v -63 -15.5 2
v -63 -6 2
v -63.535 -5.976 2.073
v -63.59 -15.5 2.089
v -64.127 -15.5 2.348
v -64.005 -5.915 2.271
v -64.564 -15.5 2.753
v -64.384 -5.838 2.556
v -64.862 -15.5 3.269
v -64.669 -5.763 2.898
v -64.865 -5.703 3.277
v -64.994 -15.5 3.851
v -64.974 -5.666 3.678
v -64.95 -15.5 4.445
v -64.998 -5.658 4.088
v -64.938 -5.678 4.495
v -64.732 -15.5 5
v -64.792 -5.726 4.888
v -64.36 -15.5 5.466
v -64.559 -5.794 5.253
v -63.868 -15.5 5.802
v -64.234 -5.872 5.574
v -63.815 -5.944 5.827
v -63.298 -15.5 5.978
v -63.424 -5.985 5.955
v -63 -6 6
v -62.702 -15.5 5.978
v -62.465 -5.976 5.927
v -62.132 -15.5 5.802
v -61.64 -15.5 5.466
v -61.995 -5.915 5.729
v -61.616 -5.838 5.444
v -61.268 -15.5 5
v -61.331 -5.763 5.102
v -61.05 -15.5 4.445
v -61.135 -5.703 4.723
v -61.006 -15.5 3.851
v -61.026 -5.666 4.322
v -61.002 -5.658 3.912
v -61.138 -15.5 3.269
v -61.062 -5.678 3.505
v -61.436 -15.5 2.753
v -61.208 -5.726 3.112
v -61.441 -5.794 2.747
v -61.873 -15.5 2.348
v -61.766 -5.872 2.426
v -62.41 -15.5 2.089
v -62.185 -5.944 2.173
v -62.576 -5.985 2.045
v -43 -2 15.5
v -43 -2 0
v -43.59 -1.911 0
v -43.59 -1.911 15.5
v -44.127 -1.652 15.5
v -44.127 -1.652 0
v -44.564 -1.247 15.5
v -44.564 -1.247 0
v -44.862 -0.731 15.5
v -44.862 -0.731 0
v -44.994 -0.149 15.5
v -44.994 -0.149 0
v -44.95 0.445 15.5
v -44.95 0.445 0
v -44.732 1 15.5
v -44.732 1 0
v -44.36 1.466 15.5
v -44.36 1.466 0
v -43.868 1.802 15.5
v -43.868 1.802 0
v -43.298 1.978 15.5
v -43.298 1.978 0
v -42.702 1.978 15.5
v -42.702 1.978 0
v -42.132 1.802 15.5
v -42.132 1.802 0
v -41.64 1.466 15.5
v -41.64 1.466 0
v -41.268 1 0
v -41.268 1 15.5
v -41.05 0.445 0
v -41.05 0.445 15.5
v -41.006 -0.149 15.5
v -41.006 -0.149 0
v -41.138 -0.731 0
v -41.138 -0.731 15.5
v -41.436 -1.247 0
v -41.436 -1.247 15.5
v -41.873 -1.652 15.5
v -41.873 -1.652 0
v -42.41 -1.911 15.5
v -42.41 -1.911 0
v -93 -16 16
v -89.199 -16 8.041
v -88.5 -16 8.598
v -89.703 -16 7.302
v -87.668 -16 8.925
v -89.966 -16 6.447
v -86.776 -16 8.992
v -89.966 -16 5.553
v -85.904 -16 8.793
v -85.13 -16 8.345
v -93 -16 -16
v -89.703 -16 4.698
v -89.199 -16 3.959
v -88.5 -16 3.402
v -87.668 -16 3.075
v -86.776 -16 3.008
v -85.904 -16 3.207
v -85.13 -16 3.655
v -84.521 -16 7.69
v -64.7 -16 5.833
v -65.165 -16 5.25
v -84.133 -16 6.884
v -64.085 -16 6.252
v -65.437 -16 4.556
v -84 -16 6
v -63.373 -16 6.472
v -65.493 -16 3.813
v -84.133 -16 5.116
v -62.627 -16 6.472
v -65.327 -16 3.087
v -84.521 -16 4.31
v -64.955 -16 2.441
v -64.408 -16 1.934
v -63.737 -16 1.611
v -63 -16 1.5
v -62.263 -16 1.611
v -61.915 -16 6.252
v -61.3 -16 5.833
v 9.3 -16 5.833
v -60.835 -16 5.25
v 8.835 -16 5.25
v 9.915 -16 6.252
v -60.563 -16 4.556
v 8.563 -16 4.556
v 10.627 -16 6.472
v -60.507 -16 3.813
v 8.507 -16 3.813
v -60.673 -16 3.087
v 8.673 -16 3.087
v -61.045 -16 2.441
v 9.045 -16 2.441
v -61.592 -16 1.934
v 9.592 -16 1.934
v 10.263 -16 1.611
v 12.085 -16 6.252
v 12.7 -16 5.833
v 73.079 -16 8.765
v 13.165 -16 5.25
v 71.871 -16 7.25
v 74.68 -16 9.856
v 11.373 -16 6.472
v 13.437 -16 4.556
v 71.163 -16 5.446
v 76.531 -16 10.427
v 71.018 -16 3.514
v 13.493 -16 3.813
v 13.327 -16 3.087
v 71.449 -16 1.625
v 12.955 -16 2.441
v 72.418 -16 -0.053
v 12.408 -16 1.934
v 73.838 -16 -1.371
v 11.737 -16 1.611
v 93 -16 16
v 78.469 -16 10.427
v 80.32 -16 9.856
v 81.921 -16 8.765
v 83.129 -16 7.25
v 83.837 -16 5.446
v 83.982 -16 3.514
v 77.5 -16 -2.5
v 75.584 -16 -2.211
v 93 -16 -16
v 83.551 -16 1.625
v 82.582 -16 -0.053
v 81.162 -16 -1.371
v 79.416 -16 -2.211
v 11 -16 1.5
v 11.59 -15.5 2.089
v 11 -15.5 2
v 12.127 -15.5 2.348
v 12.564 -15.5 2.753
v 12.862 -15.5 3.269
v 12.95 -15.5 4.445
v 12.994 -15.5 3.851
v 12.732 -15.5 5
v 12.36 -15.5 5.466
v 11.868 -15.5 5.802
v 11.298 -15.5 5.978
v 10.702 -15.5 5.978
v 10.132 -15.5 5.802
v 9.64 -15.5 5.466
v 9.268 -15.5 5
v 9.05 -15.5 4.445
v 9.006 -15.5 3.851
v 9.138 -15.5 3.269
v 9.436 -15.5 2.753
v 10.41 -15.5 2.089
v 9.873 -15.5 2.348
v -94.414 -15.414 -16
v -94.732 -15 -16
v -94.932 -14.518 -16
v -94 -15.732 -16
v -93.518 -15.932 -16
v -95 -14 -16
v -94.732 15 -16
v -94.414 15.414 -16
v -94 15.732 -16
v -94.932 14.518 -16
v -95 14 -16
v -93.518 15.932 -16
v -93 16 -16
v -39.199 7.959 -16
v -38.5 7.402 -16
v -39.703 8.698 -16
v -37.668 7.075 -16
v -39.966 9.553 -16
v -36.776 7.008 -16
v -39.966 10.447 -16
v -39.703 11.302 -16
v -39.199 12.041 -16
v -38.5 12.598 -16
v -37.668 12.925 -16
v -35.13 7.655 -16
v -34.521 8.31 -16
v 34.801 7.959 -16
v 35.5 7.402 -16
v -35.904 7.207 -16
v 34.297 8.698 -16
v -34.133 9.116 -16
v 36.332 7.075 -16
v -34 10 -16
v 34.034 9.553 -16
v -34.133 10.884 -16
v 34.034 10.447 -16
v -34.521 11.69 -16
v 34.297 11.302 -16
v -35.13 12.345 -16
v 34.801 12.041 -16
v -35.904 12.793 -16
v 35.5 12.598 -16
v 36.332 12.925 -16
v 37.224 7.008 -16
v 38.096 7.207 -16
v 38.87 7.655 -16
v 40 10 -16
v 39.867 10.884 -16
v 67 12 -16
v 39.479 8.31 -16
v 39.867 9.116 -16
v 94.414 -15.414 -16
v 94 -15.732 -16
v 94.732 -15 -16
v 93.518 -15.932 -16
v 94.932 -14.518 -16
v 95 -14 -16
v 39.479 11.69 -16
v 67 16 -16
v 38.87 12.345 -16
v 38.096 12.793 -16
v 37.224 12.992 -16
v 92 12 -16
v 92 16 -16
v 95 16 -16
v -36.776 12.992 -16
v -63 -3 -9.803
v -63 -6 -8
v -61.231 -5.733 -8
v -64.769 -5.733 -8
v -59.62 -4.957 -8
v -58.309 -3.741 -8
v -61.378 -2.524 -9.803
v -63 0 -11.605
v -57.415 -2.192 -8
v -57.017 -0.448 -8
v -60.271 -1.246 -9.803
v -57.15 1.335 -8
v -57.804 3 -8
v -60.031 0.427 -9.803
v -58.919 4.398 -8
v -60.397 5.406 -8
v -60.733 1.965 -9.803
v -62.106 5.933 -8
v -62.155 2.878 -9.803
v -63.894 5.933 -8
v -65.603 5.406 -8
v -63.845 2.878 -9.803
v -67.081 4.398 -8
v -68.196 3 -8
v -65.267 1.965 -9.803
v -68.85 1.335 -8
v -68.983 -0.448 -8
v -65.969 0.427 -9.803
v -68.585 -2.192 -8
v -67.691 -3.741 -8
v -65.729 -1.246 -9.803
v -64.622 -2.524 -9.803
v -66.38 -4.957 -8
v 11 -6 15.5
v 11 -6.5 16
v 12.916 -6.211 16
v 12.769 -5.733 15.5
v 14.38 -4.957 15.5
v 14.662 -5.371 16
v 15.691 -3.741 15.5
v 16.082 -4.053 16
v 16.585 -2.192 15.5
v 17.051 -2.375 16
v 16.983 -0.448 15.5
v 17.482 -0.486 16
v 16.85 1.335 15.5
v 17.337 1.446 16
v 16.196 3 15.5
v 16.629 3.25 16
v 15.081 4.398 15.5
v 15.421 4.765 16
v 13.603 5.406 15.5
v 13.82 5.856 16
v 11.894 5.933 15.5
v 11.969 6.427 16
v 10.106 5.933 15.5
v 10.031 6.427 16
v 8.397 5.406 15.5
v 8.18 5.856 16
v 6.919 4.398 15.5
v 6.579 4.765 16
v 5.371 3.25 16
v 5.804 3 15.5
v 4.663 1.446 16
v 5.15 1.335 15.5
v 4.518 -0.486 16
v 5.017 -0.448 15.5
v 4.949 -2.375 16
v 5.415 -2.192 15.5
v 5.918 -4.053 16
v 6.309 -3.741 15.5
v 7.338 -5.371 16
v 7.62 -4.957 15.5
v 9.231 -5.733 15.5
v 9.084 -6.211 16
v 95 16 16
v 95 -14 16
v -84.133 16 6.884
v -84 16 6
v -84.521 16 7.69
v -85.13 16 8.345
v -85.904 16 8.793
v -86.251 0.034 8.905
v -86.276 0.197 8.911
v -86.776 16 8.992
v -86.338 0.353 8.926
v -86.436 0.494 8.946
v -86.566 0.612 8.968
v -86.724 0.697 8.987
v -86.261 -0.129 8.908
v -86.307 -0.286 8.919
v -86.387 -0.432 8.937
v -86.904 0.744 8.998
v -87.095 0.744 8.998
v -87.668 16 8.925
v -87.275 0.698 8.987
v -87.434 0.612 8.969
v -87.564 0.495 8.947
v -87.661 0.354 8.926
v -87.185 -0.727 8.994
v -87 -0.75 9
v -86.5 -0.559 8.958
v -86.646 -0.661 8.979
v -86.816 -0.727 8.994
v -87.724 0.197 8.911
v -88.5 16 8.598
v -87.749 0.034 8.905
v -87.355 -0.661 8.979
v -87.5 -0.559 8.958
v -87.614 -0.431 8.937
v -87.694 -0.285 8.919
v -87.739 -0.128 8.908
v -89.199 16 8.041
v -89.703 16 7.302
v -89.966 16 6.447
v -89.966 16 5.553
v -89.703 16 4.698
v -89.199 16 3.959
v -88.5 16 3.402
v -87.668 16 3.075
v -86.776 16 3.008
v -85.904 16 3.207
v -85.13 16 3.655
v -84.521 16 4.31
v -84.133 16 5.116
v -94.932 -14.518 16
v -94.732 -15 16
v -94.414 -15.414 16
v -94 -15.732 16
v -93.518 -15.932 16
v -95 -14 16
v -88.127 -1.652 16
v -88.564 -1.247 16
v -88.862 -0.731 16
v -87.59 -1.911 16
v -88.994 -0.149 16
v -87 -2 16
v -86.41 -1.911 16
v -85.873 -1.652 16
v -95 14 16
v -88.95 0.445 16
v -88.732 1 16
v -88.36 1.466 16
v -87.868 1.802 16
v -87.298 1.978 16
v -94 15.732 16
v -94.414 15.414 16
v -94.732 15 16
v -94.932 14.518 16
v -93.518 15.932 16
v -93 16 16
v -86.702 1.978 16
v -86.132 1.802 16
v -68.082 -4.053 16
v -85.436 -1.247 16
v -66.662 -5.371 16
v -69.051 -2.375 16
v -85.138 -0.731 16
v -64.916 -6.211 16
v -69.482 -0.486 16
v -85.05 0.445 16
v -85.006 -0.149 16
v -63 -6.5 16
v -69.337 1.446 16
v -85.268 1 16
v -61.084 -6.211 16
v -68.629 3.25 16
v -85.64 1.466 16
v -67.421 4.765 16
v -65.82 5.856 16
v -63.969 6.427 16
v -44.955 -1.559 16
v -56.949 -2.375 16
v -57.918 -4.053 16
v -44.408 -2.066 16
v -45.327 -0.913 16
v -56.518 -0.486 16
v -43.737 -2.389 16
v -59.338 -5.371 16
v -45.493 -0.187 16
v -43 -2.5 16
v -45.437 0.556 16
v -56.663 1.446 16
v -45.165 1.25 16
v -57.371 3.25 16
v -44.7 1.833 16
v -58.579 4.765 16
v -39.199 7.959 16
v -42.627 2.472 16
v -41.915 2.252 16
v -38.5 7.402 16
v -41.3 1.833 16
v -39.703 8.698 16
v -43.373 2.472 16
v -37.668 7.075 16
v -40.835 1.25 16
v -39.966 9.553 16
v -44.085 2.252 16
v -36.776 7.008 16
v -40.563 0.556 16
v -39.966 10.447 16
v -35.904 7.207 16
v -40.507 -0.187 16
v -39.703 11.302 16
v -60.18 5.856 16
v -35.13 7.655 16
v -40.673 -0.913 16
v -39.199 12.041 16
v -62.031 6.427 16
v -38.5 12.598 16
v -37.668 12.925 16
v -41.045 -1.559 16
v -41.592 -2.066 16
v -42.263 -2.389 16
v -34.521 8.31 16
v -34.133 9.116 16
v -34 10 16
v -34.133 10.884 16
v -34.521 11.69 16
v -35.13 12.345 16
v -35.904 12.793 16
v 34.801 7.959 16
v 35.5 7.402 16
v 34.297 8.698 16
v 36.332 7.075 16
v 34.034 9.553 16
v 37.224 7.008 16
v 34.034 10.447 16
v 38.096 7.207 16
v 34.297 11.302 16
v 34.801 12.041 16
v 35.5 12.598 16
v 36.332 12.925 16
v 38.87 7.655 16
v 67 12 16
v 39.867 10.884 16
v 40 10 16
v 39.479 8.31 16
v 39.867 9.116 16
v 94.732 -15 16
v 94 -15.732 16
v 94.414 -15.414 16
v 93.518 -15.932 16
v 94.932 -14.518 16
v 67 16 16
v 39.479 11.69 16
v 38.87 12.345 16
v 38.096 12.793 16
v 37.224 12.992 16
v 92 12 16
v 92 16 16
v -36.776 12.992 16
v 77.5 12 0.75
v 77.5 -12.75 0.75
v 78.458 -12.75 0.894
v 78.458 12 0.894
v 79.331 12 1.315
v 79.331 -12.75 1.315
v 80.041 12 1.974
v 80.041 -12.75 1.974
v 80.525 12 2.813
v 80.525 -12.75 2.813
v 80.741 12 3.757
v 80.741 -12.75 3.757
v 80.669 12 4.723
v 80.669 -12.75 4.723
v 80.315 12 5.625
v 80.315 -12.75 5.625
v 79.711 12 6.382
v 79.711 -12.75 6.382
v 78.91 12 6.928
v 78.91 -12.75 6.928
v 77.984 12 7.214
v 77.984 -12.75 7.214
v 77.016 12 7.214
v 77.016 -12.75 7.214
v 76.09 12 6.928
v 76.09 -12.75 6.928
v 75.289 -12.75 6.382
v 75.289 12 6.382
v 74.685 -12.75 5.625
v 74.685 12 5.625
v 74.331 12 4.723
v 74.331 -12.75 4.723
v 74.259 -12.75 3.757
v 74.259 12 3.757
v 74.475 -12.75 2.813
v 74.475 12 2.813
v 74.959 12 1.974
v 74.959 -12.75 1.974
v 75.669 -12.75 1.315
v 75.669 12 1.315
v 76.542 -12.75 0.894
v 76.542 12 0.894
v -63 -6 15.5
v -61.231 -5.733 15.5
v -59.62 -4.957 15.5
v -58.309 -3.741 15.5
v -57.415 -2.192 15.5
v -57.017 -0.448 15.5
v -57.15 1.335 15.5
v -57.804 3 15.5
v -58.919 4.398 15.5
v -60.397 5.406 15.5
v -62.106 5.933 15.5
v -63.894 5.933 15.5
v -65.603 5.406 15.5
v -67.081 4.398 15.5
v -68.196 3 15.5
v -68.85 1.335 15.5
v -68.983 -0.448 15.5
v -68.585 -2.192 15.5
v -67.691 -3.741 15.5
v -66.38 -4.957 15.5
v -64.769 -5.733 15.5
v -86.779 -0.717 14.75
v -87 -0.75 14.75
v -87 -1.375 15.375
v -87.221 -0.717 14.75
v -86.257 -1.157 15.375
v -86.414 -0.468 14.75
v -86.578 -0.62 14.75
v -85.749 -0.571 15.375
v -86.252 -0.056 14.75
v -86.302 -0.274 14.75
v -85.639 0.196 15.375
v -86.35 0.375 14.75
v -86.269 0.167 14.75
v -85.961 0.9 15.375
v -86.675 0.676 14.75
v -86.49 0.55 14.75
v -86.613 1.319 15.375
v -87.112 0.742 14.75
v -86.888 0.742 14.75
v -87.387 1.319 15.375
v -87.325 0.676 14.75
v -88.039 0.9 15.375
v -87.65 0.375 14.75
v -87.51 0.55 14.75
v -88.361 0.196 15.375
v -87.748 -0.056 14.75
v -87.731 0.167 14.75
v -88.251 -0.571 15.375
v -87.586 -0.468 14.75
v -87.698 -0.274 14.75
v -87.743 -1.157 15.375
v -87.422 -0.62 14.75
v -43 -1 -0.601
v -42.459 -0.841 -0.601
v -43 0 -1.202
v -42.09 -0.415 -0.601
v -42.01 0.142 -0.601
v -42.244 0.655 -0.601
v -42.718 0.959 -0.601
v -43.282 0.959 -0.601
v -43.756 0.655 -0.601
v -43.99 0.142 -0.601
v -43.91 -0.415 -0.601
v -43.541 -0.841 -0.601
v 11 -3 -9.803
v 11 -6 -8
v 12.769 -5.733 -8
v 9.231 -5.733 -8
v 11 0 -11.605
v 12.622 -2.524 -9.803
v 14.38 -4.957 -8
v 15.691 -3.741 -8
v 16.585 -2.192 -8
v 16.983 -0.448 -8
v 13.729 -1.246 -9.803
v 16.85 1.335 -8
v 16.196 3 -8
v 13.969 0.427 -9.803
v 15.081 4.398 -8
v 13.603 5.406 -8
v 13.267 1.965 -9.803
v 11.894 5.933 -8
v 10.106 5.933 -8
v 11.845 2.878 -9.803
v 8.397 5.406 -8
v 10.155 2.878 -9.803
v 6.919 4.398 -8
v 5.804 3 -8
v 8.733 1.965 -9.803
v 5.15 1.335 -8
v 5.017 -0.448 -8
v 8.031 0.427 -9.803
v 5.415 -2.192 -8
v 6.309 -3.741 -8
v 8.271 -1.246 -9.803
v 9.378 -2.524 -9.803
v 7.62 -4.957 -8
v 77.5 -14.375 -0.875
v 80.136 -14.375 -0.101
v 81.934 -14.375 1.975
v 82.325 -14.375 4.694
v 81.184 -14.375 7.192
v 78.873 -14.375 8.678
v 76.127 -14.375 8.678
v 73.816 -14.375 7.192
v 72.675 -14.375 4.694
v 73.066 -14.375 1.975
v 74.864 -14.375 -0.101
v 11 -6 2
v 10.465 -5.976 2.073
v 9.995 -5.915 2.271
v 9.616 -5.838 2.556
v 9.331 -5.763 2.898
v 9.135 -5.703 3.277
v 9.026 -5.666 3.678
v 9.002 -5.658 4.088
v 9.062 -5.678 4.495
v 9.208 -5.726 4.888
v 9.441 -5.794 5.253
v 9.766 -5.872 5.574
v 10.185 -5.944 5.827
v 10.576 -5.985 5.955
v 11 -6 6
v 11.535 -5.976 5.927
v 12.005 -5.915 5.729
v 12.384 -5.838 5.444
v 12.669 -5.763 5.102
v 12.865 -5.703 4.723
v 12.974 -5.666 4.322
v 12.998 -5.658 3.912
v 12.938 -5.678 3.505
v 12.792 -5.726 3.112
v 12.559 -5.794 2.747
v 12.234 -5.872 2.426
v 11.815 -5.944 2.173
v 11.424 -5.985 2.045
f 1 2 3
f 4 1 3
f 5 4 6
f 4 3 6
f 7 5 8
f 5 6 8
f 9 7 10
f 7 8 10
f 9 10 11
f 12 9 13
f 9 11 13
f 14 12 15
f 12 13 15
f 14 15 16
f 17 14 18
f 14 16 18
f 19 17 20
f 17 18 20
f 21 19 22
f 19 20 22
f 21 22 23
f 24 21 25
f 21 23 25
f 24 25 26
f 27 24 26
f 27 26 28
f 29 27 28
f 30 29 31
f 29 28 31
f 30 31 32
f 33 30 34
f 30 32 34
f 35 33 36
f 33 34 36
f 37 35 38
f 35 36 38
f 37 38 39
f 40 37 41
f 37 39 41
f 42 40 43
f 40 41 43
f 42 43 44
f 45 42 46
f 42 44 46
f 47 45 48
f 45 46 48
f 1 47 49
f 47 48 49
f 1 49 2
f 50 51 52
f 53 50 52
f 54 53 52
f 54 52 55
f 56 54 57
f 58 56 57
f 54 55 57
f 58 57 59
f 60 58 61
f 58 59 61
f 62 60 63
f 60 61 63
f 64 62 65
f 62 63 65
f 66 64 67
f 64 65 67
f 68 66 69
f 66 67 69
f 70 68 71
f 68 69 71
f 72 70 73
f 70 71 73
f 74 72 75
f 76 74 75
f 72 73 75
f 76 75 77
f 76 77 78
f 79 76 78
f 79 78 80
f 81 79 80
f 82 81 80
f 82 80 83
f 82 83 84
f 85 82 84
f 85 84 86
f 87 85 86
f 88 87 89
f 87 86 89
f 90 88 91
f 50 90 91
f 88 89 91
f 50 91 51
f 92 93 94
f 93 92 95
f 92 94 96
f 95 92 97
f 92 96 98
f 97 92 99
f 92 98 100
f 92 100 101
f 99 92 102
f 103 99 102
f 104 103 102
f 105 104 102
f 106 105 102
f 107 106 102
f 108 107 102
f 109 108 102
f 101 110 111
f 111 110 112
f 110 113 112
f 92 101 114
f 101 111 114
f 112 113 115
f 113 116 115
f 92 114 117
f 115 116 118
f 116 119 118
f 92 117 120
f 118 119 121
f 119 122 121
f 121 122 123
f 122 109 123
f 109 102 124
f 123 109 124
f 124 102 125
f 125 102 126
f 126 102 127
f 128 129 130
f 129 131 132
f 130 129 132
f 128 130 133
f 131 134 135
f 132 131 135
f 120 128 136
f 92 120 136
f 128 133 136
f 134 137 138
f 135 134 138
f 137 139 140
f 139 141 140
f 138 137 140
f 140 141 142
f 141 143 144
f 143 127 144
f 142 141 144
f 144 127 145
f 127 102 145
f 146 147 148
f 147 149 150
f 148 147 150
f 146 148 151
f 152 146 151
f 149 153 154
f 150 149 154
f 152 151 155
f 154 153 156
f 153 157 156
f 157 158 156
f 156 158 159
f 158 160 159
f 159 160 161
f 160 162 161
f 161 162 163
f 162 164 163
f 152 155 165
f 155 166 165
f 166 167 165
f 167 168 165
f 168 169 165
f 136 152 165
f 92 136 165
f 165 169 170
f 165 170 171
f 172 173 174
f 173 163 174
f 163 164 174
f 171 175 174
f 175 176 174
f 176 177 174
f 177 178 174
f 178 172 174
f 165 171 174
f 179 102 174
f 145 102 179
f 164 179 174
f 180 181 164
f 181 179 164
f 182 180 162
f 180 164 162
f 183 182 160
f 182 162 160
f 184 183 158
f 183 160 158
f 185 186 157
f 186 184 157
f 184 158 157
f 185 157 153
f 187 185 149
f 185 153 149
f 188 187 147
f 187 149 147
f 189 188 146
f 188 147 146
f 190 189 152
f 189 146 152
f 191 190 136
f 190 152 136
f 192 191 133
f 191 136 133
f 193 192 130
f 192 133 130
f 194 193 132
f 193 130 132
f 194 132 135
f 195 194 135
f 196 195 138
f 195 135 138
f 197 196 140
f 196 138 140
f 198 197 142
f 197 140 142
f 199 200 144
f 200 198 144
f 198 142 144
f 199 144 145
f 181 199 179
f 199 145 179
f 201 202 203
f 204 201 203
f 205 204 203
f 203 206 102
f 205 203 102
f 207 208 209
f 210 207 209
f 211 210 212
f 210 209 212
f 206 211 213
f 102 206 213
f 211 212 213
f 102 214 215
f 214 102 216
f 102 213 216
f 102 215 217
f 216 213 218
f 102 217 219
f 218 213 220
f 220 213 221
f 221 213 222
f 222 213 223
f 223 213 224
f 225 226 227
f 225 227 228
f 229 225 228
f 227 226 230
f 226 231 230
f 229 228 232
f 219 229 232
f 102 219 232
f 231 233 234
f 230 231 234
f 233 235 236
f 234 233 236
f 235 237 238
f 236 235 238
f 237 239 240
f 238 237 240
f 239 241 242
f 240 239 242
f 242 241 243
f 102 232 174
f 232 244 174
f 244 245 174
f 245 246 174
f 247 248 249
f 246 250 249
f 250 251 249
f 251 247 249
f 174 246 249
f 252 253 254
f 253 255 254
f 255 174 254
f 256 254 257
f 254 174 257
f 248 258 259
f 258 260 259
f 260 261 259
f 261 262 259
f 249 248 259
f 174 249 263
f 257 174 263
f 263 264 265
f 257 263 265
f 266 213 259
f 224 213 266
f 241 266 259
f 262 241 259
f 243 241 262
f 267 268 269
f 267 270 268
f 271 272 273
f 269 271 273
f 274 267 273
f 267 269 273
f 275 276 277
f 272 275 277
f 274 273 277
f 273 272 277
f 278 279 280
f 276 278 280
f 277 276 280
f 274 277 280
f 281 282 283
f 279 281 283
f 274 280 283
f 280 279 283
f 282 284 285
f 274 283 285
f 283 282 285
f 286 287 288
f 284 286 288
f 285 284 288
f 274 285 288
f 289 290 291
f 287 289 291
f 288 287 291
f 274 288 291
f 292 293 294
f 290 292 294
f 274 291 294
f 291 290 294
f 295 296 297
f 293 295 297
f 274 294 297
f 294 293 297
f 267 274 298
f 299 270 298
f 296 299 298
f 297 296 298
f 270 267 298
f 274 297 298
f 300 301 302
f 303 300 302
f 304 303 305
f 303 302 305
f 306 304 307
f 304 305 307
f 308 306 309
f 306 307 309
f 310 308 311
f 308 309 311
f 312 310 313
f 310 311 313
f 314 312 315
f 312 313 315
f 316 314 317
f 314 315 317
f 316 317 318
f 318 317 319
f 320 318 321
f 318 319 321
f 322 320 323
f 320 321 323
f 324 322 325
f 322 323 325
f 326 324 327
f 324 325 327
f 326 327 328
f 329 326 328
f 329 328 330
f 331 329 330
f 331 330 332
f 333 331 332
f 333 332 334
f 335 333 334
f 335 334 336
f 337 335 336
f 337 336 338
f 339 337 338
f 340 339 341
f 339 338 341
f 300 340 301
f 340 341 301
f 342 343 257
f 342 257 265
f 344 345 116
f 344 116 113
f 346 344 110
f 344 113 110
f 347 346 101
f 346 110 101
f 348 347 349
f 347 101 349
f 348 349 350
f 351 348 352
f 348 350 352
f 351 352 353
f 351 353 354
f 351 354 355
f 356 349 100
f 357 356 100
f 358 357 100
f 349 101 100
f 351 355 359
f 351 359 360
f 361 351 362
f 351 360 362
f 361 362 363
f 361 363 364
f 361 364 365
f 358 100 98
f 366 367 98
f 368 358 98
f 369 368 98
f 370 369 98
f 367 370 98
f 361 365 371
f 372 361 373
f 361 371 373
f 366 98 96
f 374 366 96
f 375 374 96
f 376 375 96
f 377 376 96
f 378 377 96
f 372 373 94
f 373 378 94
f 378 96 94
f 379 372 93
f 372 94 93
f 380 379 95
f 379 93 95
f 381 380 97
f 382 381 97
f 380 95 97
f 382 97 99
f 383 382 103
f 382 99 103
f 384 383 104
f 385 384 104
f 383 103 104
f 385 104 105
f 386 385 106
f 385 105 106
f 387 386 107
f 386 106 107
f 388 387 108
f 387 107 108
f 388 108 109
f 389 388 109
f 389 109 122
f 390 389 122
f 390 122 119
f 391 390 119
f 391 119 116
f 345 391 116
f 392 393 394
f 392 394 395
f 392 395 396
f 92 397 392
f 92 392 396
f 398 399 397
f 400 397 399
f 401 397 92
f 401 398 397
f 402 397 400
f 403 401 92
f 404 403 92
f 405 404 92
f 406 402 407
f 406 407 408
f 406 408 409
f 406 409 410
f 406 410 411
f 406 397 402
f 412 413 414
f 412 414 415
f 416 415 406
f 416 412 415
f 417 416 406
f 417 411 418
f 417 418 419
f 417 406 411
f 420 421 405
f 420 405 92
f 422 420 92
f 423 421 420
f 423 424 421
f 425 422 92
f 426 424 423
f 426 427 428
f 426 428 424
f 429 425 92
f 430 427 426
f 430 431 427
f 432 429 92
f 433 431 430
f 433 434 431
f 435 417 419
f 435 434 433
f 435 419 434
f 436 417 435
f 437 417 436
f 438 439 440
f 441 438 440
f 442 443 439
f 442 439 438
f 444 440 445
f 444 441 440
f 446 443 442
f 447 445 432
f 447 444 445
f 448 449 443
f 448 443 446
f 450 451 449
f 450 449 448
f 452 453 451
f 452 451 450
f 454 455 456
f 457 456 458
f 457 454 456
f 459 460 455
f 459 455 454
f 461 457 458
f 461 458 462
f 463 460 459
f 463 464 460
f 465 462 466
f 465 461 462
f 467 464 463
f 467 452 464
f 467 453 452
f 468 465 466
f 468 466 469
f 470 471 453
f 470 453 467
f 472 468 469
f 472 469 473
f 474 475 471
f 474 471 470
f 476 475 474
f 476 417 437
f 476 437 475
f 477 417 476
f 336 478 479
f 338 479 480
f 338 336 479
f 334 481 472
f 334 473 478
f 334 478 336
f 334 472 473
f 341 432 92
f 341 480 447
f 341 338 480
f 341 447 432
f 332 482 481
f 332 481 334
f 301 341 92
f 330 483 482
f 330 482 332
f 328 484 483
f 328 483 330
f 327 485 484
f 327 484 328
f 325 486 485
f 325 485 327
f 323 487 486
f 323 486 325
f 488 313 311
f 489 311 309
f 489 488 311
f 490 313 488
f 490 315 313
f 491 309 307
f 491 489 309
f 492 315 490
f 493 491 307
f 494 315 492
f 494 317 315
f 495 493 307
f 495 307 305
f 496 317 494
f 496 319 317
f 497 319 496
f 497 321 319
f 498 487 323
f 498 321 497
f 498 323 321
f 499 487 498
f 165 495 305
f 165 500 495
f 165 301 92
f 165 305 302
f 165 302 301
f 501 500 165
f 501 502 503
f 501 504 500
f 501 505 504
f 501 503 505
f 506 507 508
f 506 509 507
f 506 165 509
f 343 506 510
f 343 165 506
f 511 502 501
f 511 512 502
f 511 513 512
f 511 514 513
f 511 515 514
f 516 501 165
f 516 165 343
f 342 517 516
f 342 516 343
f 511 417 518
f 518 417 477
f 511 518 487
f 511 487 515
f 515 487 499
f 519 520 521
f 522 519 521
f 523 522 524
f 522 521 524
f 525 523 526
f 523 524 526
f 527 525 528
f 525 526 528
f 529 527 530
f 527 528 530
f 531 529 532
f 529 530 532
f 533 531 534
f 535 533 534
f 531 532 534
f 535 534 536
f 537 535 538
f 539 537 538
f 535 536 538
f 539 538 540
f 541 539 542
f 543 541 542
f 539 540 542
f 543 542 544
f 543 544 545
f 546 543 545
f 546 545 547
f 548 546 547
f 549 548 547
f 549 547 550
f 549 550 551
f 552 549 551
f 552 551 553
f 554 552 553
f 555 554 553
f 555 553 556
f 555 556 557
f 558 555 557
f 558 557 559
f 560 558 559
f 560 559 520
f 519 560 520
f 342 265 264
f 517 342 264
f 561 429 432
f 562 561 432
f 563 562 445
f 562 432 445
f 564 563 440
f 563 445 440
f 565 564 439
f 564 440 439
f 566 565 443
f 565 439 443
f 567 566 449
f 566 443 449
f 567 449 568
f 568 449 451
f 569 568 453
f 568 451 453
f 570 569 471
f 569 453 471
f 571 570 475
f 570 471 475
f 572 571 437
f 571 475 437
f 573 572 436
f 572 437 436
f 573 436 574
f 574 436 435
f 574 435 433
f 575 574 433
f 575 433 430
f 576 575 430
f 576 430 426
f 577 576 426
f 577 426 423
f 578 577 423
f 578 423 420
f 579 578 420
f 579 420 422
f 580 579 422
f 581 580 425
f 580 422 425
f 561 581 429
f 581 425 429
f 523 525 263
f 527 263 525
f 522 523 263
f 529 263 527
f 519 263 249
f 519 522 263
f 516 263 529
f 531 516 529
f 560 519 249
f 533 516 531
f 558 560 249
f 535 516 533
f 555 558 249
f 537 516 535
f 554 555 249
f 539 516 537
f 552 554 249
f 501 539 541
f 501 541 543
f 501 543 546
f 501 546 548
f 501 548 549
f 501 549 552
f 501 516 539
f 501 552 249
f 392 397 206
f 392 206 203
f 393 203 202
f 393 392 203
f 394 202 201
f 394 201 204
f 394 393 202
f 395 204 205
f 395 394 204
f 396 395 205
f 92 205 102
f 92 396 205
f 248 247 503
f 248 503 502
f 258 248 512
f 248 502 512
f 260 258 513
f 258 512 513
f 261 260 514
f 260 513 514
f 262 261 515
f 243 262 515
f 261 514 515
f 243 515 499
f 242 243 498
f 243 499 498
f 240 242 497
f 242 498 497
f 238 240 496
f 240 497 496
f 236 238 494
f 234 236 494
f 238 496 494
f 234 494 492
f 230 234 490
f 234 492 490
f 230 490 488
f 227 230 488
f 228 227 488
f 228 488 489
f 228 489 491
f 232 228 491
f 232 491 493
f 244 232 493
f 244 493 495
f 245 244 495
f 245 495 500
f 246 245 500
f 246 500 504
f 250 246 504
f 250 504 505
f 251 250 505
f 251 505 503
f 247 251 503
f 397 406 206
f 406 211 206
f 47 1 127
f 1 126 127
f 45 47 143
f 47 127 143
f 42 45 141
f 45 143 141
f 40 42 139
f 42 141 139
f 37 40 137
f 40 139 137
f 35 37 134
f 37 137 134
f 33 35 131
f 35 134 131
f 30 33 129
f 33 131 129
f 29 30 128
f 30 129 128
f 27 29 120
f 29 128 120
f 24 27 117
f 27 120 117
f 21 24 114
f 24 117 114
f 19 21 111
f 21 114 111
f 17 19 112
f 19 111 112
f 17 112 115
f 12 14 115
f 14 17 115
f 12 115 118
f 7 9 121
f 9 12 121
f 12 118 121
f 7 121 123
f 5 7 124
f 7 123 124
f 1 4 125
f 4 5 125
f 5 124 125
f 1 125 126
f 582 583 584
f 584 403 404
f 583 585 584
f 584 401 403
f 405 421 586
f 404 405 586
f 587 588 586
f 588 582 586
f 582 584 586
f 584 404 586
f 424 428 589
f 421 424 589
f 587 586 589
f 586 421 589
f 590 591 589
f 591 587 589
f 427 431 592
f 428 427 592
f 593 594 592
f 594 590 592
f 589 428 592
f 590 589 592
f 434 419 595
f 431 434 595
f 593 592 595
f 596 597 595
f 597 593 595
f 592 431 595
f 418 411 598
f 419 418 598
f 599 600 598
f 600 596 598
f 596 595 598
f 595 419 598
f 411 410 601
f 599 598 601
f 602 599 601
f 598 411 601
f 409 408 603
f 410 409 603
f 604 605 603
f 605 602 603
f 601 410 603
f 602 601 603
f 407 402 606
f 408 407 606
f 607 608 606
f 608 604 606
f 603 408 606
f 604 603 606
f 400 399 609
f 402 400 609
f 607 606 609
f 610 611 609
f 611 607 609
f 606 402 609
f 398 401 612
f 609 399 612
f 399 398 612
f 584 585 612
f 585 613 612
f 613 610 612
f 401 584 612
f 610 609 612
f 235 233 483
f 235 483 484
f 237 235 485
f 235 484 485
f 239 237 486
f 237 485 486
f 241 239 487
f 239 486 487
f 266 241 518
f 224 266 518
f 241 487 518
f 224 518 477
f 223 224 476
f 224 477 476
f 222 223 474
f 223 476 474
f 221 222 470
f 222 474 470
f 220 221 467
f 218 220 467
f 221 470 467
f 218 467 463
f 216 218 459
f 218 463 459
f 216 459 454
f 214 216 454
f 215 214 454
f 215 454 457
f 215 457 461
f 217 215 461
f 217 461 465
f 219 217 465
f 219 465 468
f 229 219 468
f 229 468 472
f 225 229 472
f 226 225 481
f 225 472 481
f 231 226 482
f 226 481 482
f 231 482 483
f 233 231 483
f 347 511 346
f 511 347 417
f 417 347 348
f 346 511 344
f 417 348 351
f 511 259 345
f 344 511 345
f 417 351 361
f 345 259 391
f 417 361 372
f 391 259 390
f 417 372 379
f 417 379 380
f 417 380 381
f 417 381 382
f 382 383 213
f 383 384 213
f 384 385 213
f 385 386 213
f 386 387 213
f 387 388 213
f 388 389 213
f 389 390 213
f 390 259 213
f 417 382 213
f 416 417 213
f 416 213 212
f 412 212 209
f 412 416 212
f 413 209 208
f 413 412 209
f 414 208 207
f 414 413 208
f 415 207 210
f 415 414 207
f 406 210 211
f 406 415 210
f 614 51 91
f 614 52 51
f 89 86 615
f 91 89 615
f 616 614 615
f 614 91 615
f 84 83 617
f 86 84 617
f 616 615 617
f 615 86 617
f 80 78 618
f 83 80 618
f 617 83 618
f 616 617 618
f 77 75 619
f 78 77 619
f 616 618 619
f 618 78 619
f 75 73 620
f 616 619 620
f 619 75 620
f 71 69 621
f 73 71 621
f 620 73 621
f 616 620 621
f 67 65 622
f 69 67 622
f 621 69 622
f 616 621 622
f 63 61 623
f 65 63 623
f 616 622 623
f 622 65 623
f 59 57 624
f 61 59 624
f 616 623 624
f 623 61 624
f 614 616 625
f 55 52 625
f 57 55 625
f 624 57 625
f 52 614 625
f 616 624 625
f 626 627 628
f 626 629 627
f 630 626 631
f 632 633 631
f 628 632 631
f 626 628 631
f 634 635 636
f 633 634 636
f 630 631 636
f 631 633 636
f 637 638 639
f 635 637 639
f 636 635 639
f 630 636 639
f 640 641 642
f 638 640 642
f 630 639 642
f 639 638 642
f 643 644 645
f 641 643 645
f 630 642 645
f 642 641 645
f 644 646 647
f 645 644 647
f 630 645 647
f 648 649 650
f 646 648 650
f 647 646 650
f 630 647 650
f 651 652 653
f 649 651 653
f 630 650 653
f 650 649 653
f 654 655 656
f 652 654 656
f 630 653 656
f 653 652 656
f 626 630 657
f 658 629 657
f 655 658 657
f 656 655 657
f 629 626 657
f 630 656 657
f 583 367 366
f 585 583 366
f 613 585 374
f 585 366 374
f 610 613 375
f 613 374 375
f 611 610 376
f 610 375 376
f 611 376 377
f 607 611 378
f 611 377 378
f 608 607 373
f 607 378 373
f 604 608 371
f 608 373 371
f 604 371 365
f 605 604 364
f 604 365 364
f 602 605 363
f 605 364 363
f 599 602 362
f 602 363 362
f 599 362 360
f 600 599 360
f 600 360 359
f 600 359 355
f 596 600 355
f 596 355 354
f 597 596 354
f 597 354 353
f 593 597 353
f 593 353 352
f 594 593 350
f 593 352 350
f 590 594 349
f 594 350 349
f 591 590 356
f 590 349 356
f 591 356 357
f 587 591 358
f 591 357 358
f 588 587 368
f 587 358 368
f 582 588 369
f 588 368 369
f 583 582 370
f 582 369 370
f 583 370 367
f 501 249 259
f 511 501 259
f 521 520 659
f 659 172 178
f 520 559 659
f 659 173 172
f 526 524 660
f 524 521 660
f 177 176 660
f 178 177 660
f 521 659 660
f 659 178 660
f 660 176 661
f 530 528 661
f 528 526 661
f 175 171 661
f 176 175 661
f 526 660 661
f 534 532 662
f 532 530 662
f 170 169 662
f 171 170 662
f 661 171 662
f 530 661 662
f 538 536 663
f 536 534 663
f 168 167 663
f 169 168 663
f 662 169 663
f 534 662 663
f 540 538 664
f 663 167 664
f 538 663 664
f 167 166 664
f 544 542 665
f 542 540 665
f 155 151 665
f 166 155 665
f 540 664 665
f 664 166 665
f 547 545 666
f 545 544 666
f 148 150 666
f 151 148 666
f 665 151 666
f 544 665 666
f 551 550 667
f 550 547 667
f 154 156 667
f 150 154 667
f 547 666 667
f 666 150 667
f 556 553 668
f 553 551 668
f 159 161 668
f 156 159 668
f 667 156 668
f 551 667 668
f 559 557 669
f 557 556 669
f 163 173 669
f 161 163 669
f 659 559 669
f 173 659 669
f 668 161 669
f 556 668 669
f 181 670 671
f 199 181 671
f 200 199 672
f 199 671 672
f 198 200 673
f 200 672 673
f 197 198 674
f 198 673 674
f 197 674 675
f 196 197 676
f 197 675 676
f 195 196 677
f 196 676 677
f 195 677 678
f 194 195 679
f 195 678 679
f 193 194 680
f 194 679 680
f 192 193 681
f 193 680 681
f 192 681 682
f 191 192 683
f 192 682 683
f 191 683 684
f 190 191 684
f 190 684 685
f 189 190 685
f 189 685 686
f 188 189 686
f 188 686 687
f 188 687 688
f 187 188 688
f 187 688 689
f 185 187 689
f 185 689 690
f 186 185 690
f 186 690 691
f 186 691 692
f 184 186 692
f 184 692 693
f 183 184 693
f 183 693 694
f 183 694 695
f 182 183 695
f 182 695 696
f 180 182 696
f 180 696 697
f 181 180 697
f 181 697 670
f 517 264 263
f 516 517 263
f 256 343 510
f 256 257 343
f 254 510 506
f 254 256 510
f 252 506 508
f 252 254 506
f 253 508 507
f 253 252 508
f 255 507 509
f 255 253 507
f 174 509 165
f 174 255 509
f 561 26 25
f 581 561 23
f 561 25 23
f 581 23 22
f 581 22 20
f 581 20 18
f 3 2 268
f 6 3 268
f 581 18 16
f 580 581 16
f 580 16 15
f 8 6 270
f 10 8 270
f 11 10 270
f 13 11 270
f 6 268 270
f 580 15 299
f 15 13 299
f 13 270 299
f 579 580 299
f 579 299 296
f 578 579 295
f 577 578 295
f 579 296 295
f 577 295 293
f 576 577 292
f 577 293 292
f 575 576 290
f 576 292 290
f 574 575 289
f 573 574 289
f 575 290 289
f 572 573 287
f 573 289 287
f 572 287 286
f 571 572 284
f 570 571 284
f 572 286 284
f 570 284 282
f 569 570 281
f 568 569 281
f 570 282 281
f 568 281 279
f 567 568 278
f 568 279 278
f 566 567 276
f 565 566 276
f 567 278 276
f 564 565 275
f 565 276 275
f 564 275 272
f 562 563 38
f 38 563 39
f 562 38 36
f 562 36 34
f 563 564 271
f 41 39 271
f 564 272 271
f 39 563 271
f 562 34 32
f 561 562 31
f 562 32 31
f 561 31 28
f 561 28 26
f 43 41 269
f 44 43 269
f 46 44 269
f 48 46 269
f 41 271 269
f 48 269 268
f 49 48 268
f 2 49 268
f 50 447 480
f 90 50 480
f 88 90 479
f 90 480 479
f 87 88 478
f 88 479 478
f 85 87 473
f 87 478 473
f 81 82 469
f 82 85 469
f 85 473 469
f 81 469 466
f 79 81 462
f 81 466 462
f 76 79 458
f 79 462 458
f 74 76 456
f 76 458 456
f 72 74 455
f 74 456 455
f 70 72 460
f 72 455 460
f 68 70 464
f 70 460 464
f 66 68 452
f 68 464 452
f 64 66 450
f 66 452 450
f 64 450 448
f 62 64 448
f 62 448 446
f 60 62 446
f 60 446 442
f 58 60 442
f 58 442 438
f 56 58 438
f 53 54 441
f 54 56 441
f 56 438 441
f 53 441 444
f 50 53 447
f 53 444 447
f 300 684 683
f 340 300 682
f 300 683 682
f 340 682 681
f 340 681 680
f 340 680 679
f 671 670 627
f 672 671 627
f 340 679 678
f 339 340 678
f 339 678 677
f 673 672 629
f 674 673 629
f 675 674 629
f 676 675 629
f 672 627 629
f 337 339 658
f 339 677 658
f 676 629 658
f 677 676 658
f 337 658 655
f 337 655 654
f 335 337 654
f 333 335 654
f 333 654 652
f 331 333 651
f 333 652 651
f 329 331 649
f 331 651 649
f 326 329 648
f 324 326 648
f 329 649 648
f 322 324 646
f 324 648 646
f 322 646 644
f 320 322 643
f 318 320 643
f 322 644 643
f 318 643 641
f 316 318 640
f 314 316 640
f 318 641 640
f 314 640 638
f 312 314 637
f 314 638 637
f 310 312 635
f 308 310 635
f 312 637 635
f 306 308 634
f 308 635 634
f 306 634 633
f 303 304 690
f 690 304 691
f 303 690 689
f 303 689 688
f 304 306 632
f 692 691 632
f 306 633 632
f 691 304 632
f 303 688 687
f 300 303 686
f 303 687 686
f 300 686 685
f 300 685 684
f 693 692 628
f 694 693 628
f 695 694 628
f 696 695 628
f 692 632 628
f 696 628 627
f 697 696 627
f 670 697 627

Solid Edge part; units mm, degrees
sketch "Sketch1" plane through (0, 0, 0) normal (0, 0, 1) x (1, 0, 0)
  line L0 (95, 16) -> (-95, 16)
  line L1 (-95, 16) -> (-95, -16)
  line L2 (-95, -16) -> (95, -16)
  line L3 (95, -16) -> (95, 16)
extrude "Protrusion1" add sketch "Sketch1" along normal mid plane 32
fillet "Round_1" radius 2 3 edges at (95, -16, 0) (-95, -16, 0) (-95, 16, 0)
sketch "Sketch2" plane through (0, 0, 16) normal (0, 0, 1) x (1, 0, 0)
  line L0 (67, 16) -> (92, 16)
  line L1 (92, 16) -> (92, 12)
  line L2 (92, 12) -> (67, 12)
  line L3 (67, 12) -> (67, 16)
extrude "ExtrudedCutout_1" cut sketch "Sketch2" against normal blind 60.1716
hole "Hole_3" at (-63, 0, 16) direction (0, 0, -1) diameter 12 depth 24 tip angle 118 countersink diameter 13 countersink angle 90
hole "Hole1" at (11, 0, 16) direction (0, 0, -1) diameter 12 depth 24 tip angle 118 countersink diameter 13 countersink angle 90
hole "Hole_6" at (-63, -16, 4) direction (0, 1, 0) diameter 4 depth 11.5 tip angle 118 countersink diameter 5 countersink angle 90
hole "Hole2" at (11, -16, 4) direction (0, 1, 0) diameter 4 depth 11.5 tip angle 118 countersink diameter 5 countersink angle 90
hole "Hole_8" at (77.5, -16, 4) direction (0, 1, 0) diameter 6.5 end through all countersink diameter 13 countersink angle 90
sketch "Sketch3" plane through (0, -16, 0) normal (0, -1, 0) x (1, 0, 0)
  circle A0 centre (-87, 6) radius 3
extrude "ExtrudedCutout_2" cut sketch "Sketch3" against normal blind 90
hole "Hole_9" at (-87, 0, 16) direction (0, 0, -1) diameter 1.5 depth 10 tip angle 118 countersink diameter 4 countersink angle 90
hole "Hole_10" at (-43, 0, 16) direction (0, 0, -1) diameter 4 depth 16 tip angle 118 countersink diameter 5 countersink angle 90
sketch "Sketch4" plane through (0, 0, 16) normal (0, 0, 1) x (1, 0, 0)
  circle A0 centre (-37, 10) radius 3
  circle A1 centre (37, 10) radius 3
  dimension "D1" = 6
  dimension "D2" = 58
  dimension "D3" = 6
extrude "ExtrudedCutout_3" cut sketch "Sketch4" against normal blind 60
